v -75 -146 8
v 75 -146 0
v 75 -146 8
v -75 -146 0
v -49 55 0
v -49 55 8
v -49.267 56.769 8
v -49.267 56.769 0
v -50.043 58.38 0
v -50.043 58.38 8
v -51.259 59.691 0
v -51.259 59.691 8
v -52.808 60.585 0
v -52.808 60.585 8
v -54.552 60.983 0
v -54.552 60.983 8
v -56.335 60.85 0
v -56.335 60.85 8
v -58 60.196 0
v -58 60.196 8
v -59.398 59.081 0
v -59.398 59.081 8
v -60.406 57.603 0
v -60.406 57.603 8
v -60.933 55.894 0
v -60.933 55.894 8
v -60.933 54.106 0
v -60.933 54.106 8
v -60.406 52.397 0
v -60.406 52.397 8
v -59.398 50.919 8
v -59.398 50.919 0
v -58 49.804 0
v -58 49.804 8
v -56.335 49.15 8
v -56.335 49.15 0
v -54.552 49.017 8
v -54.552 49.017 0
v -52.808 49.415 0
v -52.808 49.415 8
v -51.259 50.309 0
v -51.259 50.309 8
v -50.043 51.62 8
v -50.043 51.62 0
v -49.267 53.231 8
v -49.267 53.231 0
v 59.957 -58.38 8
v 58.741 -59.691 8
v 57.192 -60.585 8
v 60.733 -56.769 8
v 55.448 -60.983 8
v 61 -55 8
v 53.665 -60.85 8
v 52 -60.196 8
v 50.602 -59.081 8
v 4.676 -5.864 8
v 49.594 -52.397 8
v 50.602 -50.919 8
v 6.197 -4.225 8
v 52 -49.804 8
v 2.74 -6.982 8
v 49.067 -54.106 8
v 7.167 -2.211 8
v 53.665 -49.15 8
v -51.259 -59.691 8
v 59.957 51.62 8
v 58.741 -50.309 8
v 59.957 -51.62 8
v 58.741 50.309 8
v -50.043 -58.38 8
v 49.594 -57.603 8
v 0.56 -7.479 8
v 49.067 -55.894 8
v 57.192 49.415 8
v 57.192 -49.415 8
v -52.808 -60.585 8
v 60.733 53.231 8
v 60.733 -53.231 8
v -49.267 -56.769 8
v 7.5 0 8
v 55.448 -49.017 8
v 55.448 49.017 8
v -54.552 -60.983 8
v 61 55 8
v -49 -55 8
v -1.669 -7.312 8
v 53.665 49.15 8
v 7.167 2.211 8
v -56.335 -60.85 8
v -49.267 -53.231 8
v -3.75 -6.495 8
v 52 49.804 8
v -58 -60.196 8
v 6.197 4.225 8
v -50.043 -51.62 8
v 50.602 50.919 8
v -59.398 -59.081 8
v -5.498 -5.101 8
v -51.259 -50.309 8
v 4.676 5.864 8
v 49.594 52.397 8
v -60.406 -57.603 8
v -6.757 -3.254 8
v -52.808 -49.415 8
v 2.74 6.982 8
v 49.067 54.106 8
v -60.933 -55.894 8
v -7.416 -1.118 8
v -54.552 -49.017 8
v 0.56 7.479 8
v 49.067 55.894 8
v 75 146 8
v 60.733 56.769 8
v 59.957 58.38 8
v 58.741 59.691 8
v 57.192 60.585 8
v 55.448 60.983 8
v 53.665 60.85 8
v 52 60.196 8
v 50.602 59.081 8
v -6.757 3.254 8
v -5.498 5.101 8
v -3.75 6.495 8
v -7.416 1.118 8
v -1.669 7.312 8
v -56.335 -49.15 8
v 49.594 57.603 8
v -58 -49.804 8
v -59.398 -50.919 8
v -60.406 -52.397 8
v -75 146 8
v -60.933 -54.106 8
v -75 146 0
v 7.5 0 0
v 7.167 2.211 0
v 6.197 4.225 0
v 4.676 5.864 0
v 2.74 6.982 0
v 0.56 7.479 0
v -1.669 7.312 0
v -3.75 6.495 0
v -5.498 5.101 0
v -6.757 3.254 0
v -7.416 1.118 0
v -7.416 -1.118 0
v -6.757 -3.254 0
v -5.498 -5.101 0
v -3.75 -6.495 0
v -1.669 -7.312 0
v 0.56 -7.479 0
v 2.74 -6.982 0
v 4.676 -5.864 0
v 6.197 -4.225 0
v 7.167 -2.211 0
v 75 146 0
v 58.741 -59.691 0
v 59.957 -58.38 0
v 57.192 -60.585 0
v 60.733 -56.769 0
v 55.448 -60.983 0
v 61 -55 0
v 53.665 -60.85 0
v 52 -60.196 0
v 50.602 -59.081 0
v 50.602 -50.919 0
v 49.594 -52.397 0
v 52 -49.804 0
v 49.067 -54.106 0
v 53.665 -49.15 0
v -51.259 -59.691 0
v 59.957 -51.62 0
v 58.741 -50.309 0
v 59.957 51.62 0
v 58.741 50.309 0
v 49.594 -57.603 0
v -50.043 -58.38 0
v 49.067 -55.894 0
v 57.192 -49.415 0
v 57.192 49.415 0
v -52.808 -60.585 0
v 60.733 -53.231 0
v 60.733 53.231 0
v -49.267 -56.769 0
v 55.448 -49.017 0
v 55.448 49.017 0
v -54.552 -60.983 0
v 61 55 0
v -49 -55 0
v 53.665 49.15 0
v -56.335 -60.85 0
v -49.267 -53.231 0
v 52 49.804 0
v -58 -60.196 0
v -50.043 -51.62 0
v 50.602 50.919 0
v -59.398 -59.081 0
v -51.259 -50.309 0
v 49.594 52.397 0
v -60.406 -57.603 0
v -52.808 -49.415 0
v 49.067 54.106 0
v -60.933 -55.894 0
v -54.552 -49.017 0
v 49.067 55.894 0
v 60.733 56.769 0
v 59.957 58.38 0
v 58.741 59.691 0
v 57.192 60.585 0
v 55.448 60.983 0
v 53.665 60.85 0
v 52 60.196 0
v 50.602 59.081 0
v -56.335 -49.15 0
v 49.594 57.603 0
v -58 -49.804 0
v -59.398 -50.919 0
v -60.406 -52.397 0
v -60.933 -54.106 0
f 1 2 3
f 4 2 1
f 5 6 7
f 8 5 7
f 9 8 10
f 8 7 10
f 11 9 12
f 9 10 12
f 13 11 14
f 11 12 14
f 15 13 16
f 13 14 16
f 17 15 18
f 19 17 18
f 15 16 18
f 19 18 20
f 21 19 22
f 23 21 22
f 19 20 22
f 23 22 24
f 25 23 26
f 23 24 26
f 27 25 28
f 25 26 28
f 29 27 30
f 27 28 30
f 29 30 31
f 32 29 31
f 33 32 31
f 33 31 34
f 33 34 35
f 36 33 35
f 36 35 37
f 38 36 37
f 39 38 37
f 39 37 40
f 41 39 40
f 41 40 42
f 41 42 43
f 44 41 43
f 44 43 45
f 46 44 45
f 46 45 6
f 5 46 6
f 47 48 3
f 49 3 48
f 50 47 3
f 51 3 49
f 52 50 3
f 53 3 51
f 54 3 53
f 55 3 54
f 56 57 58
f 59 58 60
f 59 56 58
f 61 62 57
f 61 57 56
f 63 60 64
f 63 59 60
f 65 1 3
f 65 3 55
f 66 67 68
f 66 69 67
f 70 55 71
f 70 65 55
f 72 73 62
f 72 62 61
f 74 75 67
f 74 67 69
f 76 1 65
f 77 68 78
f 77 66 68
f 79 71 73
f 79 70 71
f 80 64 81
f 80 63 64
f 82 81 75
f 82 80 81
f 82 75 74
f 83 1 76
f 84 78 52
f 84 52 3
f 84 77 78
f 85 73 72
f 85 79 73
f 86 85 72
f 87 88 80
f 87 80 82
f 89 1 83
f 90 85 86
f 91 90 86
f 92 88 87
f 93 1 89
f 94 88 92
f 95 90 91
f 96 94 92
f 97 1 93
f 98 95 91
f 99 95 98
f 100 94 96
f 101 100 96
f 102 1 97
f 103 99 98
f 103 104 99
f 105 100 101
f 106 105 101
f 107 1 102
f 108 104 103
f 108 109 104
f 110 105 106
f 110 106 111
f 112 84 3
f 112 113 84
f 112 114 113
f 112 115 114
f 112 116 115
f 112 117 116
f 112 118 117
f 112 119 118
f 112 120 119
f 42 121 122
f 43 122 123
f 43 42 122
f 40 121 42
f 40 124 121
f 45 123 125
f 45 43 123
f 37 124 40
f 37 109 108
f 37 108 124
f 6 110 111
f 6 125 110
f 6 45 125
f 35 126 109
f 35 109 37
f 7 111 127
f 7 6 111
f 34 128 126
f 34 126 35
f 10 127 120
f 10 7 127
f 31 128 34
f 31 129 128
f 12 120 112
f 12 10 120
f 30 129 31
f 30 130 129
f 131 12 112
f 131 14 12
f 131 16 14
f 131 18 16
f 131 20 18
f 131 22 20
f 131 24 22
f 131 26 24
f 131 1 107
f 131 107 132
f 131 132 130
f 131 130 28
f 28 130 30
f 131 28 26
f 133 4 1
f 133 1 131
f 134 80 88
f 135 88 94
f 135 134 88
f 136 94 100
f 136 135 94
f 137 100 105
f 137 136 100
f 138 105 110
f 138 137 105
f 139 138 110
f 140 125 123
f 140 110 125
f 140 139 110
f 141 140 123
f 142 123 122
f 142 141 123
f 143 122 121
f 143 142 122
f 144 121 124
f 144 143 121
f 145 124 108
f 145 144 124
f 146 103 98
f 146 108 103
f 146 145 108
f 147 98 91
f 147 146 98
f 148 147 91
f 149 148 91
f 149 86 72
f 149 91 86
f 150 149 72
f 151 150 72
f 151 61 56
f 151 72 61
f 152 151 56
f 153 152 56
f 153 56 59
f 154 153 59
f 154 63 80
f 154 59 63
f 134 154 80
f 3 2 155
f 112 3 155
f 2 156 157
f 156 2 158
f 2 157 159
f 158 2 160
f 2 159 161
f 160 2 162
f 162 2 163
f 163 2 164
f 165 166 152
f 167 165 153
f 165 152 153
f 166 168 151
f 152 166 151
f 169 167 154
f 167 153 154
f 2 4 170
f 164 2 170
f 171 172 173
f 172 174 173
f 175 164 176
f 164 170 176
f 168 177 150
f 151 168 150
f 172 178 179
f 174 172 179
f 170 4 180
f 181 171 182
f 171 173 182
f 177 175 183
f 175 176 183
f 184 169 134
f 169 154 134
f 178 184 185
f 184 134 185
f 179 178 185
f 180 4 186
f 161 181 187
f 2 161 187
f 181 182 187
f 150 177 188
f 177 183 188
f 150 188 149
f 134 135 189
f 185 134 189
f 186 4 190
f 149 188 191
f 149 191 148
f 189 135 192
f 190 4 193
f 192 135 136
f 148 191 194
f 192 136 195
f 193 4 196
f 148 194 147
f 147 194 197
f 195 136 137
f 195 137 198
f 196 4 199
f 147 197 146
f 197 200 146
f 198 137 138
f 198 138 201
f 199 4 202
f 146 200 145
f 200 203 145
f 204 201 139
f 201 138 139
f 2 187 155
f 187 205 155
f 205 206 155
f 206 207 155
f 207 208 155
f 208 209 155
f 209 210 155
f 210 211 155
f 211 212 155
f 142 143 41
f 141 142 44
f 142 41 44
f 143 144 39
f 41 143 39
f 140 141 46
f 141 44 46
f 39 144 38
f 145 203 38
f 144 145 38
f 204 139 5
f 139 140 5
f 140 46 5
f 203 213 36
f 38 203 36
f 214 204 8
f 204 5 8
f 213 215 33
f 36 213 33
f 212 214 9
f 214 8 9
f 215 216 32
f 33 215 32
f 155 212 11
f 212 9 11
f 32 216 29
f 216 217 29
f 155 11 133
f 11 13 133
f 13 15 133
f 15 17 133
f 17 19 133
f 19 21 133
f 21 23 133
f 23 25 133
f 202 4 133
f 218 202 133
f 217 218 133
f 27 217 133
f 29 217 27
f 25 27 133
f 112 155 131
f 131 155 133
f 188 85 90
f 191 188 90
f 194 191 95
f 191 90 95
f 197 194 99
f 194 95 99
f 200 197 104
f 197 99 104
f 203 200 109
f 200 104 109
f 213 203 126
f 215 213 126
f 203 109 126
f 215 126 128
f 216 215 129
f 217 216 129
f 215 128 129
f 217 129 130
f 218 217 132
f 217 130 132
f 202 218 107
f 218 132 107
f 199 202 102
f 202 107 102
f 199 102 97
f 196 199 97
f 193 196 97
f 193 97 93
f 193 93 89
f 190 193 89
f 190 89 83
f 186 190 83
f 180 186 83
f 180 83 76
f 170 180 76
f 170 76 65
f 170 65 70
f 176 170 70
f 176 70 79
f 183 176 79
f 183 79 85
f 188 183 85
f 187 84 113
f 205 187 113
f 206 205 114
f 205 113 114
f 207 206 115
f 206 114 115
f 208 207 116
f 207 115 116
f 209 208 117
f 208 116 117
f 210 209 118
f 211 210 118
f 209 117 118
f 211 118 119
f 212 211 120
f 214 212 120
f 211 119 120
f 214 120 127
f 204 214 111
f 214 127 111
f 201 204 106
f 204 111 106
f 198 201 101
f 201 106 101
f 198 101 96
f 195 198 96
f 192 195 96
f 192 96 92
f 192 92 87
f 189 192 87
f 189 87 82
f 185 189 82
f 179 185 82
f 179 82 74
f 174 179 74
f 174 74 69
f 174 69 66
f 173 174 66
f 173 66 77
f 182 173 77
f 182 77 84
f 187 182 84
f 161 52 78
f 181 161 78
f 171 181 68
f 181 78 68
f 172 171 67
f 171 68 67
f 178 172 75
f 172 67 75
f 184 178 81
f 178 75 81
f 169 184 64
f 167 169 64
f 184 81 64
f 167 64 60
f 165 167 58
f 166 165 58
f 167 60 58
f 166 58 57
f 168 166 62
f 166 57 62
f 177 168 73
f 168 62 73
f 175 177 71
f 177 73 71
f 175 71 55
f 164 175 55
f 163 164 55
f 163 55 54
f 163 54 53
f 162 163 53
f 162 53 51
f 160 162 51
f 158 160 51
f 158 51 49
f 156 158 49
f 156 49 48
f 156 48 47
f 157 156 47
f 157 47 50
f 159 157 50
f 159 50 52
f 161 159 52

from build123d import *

# Parameters (mm, degrees)
SKETCH1_W           = 292
SKETCH1_H           = 150
BOSS_EXTRUDE1_DEPTH = 8
SKETCH2_R           = 6
CUT_EXTRUDE1_DEPTH  = 165.331981063
SKETCH3_R           = 7.5
CUT_EXTRUDE2_DEPTH  = 165.331981063


with BuildPart() as part:
    # Sketch1 → Boss-Extrude1 (new body)
    with BuildSketch(Plane(origin=(0, 0, 0), x_dir=(0, 1, 0), z_dir=(0, 0, 1))):
        Rectangle(SKETCH1_W, SKETCH1_H)
    extrude(amount=BOSS_EXTRUDE1_DEPTH)

    # Sketch2 → Cut-Extrude1 (cut, through all)
    with BuildSketch(Plane.XY.offset(8)):
        with Locations((-55, 55)):
            Circle(SKETCH2_R)
        with Locations((55, 55)):
            Circle(SKETCH2_R)
        with Locations((-55, -55)):
            Circle(SKETCH2_R)
        with Locations((55, -55)):
            Circle(SKETCH2_R)
    extrude(amount=-CUT_EXTRUDE1_DEPTH, mode=Mode.SUBTRACT)

    # Sketch3 → Cut-Extrude2 (cut, through all)
    with BuildSketch(Plane(origin=(0, 0, 0), x_dir=(0, 1, 0), z_dir=(0, 0, 1))):
        with Locations(Location((0, 0, 0), (0, 0, 270))):
            Circle(SKETCH3_R)
    extrude(amount=CUT_EXTRUDE2_DEPTH, mode=Mode.SUBTRACT)


solid = part.part
